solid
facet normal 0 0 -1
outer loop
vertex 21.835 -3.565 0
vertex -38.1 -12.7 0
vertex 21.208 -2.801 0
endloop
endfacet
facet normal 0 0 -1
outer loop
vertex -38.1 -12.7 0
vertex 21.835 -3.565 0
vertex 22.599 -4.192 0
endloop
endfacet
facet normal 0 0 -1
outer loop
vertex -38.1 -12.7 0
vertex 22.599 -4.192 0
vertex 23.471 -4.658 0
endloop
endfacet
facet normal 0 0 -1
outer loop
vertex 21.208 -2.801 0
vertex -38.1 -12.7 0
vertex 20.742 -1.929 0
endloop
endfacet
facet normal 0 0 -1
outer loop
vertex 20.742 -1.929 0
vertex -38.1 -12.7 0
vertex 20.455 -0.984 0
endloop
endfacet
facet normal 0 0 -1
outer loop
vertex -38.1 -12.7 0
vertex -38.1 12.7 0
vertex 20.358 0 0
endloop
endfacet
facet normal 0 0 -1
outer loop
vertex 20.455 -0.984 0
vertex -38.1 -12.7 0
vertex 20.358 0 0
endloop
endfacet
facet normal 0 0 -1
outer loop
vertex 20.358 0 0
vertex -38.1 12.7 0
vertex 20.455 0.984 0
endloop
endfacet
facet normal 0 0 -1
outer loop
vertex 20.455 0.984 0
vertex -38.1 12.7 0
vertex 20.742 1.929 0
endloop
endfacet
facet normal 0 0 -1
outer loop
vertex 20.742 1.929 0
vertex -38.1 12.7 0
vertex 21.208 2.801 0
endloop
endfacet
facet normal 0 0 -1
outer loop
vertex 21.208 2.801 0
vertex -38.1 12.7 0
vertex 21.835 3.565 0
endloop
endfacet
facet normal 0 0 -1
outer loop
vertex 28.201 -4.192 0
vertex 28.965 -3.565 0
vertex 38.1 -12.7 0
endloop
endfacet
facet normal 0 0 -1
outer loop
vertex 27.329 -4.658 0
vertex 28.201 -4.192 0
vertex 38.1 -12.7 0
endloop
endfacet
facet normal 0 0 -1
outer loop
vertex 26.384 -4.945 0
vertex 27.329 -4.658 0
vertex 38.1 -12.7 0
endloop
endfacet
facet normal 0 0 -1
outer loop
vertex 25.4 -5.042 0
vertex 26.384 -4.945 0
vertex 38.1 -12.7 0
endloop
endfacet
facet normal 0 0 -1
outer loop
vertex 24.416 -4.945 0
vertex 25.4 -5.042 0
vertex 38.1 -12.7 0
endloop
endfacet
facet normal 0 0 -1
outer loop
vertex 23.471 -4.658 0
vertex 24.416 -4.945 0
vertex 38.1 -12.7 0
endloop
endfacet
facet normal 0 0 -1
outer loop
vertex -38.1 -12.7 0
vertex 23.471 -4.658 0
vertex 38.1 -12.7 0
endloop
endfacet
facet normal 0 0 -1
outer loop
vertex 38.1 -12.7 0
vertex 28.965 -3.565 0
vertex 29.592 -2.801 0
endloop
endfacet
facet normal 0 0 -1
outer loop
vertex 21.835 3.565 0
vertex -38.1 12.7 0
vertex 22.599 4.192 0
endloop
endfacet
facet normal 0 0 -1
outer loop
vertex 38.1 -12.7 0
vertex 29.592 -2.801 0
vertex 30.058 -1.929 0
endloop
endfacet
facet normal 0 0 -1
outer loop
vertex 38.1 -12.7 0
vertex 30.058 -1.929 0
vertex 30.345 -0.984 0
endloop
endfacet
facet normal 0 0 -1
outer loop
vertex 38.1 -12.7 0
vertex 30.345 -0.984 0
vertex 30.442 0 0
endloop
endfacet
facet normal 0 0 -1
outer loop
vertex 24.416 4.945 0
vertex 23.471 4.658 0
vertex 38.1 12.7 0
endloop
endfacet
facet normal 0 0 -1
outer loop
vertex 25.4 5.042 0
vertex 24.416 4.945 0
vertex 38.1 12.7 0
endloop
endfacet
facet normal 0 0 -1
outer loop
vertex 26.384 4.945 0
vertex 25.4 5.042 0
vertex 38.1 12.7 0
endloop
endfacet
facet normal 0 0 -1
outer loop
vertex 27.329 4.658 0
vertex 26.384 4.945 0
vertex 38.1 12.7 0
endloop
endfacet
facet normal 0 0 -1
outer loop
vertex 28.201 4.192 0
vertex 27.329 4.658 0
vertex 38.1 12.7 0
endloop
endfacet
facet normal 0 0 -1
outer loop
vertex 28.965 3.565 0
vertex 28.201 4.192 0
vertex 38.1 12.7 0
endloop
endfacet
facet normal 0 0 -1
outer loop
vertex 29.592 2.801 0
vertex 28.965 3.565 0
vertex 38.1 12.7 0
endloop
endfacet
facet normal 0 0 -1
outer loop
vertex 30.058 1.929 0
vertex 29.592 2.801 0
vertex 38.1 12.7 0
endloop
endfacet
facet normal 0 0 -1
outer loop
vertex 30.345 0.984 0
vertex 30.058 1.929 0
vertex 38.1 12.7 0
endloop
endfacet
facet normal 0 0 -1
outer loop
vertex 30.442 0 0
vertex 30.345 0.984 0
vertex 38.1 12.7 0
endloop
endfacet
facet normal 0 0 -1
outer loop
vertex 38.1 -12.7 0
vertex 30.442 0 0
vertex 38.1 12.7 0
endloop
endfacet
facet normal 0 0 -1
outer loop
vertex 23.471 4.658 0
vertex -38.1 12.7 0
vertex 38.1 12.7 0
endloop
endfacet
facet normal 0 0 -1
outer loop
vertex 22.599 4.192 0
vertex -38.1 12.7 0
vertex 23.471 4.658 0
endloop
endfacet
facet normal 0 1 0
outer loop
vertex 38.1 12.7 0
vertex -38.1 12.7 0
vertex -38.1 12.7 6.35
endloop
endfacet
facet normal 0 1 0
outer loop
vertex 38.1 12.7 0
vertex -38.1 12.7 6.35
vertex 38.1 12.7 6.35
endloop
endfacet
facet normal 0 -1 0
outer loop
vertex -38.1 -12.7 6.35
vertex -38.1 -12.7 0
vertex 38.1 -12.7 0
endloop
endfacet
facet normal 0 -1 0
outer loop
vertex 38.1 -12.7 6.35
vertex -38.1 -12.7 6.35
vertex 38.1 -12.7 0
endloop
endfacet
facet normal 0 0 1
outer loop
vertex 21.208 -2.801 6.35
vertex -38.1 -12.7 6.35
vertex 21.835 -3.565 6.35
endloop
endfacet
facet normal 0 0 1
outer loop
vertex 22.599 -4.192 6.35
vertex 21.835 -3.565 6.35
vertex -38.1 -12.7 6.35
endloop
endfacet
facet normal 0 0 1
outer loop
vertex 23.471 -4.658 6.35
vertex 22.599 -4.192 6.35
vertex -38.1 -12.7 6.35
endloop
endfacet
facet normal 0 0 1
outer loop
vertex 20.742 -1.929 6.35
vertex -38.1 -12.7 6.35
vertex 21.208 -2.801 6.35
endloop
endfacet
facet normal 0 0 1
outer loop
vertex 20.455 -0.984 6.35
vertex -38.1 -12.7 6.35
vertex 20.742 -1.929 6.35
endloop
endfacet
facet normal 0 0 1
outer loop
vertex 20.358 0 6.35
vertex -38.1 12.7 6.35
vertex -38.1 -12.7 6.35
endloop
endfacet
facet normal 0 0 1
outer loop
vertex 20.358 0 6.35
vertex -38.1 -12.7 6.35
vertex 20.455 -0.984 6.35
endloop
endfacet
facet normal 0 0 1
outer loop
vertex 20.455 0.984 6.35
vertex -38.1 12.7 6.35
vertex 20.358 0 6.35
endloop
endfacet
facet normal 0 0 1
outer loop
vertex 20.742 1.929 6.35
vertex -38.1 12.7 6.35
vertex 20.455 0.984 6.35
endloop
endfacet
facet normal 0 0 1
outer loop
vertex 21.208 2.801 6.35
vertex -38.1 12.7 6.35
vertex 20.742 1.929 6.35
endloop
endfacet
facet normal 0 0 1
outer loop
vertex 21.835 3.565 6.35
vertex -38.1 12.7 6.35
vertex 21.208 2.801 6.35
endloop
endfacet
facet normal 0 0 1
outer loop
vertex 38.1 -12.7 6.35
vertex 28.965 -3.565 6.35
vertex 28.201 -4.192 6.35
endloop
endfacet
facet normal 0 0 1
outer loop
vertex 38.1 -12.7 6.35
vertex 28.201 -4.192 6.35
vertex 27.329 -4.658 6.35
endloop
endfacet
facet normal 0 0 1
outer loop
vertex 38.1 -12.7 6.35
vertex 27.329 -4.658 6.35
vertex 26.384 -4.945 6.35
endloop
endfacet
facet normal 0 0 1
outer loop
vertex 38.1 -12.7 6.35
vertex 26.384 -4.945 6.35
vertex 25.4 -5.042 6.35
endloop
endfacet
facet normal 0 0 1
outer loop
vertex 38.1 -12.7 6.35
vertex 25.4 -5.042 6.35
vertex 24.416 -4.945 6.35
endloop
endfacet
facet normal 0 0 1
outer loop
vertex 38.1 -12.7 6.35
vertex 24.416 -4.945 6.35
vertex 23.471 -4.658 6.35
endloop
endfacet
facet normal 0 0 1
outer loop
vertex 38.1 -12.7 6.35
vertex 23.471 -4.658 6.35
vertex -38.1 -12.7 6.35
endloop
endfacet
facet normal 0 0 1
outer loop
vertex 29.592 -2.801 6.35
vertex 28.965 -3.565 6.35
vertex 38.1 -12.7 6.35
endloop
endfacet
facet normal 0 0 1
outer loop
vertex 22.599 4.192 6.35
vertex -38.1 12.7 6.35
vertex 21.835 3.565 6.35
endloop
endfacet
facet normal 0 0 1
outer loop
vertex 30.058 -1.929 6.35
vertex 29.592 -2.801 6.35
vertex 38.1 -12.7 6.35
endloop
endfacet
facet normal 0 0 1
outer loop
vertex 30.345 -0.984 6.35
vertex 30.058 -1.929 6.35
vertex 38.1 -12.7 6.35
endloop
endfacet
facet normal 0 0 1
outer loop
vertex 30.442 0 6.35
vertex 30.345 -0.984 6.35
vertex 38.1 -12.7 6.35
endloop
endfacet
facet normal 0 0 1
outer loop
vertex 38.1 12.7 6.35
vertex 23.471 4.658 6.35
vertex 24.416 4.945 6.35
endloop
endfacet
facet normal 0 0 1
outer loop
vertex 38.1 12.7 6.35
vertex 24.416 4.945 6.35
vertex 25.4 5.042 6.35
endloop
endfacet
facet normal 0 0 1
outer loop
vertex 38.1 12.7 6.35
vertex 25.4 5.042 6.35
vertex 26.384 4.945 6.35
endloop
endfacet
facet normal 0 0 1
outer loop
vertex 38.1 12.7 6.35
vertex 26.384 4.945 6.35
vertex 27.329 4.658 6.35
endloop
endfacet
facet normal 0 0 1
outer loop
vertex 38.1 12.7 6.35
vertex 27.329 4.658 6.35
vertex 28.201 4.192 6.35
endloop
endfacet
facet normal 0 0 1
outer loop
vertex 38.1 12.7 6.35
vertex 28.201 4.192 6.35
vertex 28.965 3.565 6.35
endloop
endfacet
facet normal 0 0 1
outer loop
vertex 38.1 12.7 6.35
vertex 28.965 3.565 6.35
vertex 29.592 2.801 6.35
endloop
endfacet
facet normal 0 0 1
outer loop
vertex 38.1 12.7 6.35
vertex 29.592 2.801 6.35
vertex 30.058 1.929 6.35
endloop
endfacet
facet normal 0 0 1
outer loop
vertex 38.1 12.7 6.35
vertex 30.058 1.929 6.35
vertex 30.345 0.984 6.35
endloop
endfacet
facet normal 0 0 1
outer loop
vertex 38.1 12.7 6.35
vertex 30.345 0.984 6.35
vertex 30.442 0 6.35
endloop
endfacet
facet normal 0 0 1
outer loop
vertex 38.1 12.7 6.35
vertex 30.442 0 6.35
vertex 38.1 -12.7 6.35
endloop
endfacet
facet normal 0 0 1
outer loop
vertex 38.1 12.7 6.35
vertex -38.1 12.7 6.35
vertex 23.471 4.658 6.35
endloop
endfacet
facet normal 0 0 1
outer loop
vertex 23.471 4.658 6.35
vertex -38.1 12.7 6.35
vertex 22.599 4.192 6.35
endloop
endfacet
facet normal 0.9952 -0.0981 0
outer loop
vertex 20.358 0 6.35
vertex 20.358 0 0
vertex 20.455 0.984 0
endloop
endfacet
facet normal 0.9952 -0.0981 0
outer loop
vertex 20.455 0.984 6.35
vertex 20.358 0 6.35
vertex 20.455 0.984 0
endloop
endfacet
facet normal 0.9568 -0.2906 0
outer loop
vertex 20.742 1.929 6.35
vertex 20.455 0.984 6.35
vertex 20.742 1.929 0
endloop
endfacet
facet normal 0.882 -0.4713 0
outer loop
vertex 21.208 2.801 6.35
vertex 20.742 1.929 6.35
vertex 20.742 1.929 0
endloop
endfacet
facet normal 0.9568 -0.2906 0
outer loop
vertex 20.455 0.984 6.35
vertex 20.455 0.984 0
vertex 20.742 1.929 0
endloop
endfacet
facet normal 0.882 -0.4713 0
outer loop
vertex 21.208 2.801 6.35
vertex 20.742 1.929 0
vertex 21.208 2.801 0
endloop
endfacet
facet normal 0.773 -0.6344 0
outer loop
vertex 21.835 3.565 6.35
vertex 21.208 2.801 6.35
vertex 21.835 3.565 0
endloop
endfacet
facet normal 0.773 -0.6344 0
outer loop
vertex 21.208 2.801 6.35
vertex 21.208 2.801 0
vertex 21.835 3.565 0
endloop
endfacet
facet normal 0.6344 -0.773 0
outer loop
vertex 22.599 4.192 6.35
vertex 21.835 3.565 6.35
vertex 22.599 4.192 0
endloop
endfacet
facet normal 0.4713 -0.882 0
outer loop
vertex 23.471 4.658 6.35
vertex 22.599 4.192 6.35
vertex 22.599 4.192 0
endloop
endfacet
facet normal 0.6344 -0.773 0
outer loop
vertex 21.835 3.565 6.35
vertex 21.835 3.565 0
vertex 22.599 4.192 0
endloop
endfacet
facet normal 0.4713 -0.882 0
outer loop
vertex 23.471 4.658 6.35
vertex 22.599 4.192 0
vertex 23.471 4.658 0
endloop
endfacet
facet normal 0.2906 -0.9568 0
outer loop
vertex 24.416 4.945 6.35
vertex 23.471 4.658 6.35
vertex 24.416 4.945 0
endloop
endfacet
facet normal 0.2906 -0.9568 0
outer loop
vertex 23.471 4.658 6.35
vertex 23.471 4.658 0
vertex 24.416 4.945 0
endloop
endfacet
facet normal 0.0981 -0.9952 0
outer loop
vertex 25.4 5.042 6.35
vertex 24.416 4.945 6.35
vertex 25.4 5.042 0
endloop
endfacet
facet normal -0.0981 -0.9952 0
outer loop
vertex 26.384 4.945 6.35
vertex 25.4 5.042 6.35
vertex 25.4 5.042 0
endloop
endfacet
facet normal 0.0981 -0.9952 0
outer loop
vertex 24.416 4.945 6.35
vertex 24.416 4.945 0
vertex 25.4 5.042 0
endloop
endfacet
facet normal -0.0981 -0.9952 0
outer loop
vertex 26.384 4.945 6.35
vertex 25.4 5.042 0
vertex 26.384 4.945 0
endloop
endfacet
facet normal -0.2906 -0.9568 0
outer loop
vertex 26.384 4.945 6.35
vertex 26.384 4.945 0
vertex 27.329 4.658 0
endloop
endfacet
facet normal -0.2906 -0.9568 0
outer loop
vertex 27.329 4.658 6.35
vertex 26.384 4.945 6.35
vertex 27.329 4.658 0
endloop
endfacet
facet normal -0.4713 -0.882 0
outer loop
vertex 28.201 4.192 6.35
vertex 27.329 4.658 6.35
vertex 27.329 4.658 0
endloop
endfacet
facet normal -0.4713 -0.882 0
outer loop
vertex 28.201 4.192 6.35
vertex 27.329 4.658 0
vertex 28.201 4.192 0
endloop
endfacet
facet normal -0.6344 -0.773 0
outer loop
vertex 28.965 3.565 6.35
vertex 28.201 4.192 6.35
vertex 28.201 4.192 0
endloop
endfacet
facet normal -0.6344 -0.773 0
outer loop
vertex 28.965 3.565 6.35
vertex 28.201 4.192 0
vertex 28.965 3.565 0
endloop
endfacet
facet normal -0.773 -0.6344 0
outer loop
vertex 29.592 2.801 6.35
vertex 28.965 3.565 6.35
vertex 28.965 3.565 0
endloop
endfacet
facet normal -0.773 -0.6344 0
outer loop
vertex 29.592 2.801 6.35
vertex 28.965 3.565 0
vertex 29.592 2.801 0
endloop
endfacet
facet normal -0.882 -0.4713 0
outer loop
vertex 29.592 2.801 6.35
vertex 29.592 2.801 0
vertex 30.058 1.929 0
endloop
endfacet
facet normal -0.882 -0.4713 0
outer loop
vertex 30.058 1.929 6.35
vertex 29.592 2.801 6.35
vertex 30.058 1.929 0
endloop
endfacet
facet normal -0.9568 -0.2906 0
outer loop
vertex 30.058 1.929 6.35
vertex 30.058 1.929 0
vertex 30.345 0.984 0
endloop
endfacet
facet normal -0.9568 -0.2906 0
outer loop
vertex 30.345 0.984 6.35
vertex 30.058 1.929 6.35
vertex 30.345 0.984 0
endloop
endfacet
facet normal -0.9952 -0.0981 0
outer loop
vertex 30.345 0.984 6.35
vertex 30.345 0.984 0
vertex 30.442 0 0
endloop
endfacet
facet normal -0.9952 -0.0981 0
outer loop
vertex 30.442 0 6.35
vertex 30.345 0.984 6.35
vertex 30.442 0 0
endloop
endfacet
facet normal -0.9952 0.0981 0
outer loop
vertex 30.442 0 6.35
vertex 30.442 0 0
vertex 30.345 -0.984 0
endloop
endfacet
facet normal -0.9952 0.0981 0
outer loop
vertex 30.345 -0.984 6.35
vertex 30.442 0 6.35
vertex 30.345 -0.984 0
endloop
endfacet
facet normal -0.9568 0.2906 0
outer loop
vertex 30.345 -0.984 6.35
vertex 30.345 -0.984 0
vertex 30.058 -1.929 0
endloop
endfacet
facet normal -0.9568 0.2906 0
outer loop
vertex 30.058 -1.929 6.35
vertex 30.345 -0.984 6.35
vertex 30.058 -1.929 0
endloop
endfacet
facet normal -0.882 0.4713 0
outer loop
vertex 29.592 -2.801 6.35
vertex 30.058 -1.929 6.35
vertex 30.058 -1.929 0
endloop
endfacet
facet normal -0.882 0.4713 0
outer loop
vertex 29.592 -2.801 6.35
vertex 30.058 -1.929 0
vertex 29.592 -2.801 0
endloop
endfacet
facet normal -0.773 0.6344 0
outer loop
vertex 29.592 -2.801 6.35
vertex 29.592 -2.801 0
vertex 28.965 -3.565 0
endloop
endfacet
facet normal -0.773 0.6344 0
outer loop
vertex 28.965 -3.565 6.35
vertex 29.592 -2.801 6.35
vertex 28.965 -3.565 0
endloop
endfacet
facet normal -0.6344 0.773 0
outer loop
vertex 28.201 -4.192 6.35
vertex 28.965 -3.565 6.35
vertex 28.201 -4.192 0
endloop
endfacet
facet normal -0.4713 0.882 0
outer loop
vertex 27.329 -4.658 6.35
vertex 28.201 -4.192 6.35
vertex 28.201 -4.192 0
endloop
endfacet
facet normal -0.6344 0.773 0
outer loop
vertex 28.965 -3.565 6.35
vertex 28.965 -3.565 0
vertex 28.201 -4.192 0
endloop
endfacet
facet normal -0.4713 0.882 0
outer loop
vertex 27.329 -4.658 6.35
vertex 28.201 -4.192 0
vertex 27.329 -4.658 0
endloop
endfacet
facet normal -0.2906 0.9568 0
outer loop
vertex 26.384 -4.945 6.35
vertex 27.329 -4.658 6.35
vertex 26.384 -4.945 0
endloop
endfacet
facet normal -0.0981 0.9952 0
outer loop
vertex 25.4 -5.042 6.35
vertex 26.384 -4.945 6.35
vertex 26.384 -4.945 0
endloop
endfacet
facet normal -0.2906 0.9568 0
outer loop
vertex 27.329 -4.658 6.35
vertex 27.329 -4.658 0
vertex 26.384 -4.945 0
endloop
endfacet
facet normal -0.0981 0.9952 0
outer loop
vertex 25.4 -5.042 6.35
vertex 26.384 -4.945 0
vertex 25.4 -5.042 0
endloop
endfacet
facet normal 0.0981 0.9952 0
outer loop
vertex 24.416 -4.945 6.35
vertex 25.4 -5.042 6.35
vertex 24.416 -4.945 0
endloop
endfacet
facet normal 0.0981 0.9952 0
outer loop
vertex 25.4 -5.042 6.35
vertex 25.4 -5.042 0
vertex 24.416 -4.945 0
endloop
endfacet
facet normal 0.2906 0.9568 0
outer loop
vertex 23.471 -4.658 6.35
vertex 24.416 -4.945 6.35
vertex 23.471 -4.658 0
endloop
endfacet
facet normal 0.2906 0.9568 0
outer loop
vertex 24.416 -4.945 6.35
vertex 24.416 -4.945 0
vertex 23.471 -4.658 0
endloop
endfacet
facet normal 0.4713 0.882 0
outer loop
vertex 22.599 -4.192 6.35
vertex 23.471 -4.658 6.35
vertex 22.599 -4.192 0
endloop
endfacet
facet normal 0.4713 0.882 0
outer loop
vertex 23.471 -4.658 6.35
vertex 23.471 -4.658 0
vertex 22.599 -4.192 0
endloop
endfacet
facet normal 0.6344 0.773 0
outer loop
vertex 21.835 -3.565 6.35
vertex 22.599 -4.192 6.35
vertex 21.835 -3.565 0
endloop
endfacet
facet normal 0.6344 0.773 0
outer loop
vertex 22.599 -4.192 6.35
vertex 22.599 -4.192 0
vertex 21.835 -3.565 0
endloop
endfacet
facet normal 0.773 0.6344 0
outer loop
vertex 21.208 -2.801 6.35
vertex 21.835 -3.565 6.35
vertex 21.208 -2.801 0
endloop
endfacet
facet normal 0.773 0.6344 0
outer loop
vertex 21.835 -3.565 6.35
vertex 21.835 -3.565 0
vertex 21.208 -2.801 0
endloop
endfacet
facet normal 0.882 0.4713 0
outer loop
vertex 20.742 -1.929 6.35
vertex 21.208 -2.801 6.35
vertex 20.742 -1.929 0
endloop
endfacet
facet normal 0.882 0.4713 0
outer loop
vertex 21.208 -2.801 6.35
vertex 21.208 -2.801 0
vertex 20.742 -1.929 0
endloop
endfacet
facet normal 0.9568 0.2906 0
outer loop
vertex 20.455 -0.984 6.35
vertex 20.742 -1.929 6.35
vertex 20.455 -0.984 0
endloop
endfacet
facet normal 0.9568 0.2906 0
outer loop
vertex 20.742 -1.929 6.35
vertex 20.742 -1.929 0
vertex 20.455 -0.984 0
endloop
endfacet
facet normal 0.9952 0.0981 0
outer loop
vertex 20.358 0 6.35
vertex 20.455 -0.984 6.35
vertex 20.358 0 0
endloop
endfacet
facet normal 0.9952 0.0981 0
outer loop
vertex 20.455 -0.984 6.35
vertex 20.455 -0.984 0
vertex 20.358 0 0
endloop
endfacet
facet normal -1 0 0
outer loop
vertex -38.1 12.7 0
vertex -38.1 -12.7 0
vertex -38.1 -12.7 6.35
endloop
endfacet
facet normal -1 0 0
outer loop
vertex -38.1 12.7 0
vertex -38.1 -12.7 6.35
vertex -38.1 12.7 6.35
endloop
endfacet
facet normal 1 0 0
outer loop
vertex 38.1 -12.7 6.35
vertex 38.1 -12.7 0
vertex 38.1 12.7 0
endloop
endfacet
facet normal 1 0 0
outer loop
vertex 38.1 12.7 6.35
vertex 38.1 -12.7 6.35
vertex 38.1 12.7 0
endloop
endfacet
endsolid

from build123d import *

# Parameters (mm, degrees)
SKETCH1_W                   = 76.2
SKETCH1_H                   = 25.4
EXTRUDE1_DEPTH              = 6.35
F_3_8_CLEARANCE_HOLE1_D     = 10.0838
F_3_8_CLEARANCE_HOLE1_DEPTH = 16.002
F_3_8_CLEARANCE_HOLE1_TIP   = 3.029479155


with BuildPart() as part:
    # Sketch1 → Extrude1 (new body)
    with BuildSketch(Plane.XY):
        Rectangle(SKETCH1_W, SKETCH1_H)
    extrude(amount=EXTRUDE1_DEPTH)

    # 3/8 Clearance Hole1
    with Locations(Plane(origin=(25.4, 0, 6.35), x_dir=(1, 0, 0), z_dir=(0, 0, 1))):
        with Locations((0, 0)):
            Hole(F_3_8_CLEARANCE_HOLE1_D / 2, depth=F_3_8_CLEARANCE_HOLE1_DEPTH)
            with Locations((0, 0, -(F_3_8_CLEARANCE_HOLE1_DEPTH + F_3_8_CLEARANCE_HOLE1_TIP / 2))):  # 118° drill point
                Cone(0, F_3_8_CLEARANCE_HOLE1_D / 2, F_3_8_CLEARANCE_HOLE1_TIP, mode=Mode.SUBTRACT)


solid = part.part
